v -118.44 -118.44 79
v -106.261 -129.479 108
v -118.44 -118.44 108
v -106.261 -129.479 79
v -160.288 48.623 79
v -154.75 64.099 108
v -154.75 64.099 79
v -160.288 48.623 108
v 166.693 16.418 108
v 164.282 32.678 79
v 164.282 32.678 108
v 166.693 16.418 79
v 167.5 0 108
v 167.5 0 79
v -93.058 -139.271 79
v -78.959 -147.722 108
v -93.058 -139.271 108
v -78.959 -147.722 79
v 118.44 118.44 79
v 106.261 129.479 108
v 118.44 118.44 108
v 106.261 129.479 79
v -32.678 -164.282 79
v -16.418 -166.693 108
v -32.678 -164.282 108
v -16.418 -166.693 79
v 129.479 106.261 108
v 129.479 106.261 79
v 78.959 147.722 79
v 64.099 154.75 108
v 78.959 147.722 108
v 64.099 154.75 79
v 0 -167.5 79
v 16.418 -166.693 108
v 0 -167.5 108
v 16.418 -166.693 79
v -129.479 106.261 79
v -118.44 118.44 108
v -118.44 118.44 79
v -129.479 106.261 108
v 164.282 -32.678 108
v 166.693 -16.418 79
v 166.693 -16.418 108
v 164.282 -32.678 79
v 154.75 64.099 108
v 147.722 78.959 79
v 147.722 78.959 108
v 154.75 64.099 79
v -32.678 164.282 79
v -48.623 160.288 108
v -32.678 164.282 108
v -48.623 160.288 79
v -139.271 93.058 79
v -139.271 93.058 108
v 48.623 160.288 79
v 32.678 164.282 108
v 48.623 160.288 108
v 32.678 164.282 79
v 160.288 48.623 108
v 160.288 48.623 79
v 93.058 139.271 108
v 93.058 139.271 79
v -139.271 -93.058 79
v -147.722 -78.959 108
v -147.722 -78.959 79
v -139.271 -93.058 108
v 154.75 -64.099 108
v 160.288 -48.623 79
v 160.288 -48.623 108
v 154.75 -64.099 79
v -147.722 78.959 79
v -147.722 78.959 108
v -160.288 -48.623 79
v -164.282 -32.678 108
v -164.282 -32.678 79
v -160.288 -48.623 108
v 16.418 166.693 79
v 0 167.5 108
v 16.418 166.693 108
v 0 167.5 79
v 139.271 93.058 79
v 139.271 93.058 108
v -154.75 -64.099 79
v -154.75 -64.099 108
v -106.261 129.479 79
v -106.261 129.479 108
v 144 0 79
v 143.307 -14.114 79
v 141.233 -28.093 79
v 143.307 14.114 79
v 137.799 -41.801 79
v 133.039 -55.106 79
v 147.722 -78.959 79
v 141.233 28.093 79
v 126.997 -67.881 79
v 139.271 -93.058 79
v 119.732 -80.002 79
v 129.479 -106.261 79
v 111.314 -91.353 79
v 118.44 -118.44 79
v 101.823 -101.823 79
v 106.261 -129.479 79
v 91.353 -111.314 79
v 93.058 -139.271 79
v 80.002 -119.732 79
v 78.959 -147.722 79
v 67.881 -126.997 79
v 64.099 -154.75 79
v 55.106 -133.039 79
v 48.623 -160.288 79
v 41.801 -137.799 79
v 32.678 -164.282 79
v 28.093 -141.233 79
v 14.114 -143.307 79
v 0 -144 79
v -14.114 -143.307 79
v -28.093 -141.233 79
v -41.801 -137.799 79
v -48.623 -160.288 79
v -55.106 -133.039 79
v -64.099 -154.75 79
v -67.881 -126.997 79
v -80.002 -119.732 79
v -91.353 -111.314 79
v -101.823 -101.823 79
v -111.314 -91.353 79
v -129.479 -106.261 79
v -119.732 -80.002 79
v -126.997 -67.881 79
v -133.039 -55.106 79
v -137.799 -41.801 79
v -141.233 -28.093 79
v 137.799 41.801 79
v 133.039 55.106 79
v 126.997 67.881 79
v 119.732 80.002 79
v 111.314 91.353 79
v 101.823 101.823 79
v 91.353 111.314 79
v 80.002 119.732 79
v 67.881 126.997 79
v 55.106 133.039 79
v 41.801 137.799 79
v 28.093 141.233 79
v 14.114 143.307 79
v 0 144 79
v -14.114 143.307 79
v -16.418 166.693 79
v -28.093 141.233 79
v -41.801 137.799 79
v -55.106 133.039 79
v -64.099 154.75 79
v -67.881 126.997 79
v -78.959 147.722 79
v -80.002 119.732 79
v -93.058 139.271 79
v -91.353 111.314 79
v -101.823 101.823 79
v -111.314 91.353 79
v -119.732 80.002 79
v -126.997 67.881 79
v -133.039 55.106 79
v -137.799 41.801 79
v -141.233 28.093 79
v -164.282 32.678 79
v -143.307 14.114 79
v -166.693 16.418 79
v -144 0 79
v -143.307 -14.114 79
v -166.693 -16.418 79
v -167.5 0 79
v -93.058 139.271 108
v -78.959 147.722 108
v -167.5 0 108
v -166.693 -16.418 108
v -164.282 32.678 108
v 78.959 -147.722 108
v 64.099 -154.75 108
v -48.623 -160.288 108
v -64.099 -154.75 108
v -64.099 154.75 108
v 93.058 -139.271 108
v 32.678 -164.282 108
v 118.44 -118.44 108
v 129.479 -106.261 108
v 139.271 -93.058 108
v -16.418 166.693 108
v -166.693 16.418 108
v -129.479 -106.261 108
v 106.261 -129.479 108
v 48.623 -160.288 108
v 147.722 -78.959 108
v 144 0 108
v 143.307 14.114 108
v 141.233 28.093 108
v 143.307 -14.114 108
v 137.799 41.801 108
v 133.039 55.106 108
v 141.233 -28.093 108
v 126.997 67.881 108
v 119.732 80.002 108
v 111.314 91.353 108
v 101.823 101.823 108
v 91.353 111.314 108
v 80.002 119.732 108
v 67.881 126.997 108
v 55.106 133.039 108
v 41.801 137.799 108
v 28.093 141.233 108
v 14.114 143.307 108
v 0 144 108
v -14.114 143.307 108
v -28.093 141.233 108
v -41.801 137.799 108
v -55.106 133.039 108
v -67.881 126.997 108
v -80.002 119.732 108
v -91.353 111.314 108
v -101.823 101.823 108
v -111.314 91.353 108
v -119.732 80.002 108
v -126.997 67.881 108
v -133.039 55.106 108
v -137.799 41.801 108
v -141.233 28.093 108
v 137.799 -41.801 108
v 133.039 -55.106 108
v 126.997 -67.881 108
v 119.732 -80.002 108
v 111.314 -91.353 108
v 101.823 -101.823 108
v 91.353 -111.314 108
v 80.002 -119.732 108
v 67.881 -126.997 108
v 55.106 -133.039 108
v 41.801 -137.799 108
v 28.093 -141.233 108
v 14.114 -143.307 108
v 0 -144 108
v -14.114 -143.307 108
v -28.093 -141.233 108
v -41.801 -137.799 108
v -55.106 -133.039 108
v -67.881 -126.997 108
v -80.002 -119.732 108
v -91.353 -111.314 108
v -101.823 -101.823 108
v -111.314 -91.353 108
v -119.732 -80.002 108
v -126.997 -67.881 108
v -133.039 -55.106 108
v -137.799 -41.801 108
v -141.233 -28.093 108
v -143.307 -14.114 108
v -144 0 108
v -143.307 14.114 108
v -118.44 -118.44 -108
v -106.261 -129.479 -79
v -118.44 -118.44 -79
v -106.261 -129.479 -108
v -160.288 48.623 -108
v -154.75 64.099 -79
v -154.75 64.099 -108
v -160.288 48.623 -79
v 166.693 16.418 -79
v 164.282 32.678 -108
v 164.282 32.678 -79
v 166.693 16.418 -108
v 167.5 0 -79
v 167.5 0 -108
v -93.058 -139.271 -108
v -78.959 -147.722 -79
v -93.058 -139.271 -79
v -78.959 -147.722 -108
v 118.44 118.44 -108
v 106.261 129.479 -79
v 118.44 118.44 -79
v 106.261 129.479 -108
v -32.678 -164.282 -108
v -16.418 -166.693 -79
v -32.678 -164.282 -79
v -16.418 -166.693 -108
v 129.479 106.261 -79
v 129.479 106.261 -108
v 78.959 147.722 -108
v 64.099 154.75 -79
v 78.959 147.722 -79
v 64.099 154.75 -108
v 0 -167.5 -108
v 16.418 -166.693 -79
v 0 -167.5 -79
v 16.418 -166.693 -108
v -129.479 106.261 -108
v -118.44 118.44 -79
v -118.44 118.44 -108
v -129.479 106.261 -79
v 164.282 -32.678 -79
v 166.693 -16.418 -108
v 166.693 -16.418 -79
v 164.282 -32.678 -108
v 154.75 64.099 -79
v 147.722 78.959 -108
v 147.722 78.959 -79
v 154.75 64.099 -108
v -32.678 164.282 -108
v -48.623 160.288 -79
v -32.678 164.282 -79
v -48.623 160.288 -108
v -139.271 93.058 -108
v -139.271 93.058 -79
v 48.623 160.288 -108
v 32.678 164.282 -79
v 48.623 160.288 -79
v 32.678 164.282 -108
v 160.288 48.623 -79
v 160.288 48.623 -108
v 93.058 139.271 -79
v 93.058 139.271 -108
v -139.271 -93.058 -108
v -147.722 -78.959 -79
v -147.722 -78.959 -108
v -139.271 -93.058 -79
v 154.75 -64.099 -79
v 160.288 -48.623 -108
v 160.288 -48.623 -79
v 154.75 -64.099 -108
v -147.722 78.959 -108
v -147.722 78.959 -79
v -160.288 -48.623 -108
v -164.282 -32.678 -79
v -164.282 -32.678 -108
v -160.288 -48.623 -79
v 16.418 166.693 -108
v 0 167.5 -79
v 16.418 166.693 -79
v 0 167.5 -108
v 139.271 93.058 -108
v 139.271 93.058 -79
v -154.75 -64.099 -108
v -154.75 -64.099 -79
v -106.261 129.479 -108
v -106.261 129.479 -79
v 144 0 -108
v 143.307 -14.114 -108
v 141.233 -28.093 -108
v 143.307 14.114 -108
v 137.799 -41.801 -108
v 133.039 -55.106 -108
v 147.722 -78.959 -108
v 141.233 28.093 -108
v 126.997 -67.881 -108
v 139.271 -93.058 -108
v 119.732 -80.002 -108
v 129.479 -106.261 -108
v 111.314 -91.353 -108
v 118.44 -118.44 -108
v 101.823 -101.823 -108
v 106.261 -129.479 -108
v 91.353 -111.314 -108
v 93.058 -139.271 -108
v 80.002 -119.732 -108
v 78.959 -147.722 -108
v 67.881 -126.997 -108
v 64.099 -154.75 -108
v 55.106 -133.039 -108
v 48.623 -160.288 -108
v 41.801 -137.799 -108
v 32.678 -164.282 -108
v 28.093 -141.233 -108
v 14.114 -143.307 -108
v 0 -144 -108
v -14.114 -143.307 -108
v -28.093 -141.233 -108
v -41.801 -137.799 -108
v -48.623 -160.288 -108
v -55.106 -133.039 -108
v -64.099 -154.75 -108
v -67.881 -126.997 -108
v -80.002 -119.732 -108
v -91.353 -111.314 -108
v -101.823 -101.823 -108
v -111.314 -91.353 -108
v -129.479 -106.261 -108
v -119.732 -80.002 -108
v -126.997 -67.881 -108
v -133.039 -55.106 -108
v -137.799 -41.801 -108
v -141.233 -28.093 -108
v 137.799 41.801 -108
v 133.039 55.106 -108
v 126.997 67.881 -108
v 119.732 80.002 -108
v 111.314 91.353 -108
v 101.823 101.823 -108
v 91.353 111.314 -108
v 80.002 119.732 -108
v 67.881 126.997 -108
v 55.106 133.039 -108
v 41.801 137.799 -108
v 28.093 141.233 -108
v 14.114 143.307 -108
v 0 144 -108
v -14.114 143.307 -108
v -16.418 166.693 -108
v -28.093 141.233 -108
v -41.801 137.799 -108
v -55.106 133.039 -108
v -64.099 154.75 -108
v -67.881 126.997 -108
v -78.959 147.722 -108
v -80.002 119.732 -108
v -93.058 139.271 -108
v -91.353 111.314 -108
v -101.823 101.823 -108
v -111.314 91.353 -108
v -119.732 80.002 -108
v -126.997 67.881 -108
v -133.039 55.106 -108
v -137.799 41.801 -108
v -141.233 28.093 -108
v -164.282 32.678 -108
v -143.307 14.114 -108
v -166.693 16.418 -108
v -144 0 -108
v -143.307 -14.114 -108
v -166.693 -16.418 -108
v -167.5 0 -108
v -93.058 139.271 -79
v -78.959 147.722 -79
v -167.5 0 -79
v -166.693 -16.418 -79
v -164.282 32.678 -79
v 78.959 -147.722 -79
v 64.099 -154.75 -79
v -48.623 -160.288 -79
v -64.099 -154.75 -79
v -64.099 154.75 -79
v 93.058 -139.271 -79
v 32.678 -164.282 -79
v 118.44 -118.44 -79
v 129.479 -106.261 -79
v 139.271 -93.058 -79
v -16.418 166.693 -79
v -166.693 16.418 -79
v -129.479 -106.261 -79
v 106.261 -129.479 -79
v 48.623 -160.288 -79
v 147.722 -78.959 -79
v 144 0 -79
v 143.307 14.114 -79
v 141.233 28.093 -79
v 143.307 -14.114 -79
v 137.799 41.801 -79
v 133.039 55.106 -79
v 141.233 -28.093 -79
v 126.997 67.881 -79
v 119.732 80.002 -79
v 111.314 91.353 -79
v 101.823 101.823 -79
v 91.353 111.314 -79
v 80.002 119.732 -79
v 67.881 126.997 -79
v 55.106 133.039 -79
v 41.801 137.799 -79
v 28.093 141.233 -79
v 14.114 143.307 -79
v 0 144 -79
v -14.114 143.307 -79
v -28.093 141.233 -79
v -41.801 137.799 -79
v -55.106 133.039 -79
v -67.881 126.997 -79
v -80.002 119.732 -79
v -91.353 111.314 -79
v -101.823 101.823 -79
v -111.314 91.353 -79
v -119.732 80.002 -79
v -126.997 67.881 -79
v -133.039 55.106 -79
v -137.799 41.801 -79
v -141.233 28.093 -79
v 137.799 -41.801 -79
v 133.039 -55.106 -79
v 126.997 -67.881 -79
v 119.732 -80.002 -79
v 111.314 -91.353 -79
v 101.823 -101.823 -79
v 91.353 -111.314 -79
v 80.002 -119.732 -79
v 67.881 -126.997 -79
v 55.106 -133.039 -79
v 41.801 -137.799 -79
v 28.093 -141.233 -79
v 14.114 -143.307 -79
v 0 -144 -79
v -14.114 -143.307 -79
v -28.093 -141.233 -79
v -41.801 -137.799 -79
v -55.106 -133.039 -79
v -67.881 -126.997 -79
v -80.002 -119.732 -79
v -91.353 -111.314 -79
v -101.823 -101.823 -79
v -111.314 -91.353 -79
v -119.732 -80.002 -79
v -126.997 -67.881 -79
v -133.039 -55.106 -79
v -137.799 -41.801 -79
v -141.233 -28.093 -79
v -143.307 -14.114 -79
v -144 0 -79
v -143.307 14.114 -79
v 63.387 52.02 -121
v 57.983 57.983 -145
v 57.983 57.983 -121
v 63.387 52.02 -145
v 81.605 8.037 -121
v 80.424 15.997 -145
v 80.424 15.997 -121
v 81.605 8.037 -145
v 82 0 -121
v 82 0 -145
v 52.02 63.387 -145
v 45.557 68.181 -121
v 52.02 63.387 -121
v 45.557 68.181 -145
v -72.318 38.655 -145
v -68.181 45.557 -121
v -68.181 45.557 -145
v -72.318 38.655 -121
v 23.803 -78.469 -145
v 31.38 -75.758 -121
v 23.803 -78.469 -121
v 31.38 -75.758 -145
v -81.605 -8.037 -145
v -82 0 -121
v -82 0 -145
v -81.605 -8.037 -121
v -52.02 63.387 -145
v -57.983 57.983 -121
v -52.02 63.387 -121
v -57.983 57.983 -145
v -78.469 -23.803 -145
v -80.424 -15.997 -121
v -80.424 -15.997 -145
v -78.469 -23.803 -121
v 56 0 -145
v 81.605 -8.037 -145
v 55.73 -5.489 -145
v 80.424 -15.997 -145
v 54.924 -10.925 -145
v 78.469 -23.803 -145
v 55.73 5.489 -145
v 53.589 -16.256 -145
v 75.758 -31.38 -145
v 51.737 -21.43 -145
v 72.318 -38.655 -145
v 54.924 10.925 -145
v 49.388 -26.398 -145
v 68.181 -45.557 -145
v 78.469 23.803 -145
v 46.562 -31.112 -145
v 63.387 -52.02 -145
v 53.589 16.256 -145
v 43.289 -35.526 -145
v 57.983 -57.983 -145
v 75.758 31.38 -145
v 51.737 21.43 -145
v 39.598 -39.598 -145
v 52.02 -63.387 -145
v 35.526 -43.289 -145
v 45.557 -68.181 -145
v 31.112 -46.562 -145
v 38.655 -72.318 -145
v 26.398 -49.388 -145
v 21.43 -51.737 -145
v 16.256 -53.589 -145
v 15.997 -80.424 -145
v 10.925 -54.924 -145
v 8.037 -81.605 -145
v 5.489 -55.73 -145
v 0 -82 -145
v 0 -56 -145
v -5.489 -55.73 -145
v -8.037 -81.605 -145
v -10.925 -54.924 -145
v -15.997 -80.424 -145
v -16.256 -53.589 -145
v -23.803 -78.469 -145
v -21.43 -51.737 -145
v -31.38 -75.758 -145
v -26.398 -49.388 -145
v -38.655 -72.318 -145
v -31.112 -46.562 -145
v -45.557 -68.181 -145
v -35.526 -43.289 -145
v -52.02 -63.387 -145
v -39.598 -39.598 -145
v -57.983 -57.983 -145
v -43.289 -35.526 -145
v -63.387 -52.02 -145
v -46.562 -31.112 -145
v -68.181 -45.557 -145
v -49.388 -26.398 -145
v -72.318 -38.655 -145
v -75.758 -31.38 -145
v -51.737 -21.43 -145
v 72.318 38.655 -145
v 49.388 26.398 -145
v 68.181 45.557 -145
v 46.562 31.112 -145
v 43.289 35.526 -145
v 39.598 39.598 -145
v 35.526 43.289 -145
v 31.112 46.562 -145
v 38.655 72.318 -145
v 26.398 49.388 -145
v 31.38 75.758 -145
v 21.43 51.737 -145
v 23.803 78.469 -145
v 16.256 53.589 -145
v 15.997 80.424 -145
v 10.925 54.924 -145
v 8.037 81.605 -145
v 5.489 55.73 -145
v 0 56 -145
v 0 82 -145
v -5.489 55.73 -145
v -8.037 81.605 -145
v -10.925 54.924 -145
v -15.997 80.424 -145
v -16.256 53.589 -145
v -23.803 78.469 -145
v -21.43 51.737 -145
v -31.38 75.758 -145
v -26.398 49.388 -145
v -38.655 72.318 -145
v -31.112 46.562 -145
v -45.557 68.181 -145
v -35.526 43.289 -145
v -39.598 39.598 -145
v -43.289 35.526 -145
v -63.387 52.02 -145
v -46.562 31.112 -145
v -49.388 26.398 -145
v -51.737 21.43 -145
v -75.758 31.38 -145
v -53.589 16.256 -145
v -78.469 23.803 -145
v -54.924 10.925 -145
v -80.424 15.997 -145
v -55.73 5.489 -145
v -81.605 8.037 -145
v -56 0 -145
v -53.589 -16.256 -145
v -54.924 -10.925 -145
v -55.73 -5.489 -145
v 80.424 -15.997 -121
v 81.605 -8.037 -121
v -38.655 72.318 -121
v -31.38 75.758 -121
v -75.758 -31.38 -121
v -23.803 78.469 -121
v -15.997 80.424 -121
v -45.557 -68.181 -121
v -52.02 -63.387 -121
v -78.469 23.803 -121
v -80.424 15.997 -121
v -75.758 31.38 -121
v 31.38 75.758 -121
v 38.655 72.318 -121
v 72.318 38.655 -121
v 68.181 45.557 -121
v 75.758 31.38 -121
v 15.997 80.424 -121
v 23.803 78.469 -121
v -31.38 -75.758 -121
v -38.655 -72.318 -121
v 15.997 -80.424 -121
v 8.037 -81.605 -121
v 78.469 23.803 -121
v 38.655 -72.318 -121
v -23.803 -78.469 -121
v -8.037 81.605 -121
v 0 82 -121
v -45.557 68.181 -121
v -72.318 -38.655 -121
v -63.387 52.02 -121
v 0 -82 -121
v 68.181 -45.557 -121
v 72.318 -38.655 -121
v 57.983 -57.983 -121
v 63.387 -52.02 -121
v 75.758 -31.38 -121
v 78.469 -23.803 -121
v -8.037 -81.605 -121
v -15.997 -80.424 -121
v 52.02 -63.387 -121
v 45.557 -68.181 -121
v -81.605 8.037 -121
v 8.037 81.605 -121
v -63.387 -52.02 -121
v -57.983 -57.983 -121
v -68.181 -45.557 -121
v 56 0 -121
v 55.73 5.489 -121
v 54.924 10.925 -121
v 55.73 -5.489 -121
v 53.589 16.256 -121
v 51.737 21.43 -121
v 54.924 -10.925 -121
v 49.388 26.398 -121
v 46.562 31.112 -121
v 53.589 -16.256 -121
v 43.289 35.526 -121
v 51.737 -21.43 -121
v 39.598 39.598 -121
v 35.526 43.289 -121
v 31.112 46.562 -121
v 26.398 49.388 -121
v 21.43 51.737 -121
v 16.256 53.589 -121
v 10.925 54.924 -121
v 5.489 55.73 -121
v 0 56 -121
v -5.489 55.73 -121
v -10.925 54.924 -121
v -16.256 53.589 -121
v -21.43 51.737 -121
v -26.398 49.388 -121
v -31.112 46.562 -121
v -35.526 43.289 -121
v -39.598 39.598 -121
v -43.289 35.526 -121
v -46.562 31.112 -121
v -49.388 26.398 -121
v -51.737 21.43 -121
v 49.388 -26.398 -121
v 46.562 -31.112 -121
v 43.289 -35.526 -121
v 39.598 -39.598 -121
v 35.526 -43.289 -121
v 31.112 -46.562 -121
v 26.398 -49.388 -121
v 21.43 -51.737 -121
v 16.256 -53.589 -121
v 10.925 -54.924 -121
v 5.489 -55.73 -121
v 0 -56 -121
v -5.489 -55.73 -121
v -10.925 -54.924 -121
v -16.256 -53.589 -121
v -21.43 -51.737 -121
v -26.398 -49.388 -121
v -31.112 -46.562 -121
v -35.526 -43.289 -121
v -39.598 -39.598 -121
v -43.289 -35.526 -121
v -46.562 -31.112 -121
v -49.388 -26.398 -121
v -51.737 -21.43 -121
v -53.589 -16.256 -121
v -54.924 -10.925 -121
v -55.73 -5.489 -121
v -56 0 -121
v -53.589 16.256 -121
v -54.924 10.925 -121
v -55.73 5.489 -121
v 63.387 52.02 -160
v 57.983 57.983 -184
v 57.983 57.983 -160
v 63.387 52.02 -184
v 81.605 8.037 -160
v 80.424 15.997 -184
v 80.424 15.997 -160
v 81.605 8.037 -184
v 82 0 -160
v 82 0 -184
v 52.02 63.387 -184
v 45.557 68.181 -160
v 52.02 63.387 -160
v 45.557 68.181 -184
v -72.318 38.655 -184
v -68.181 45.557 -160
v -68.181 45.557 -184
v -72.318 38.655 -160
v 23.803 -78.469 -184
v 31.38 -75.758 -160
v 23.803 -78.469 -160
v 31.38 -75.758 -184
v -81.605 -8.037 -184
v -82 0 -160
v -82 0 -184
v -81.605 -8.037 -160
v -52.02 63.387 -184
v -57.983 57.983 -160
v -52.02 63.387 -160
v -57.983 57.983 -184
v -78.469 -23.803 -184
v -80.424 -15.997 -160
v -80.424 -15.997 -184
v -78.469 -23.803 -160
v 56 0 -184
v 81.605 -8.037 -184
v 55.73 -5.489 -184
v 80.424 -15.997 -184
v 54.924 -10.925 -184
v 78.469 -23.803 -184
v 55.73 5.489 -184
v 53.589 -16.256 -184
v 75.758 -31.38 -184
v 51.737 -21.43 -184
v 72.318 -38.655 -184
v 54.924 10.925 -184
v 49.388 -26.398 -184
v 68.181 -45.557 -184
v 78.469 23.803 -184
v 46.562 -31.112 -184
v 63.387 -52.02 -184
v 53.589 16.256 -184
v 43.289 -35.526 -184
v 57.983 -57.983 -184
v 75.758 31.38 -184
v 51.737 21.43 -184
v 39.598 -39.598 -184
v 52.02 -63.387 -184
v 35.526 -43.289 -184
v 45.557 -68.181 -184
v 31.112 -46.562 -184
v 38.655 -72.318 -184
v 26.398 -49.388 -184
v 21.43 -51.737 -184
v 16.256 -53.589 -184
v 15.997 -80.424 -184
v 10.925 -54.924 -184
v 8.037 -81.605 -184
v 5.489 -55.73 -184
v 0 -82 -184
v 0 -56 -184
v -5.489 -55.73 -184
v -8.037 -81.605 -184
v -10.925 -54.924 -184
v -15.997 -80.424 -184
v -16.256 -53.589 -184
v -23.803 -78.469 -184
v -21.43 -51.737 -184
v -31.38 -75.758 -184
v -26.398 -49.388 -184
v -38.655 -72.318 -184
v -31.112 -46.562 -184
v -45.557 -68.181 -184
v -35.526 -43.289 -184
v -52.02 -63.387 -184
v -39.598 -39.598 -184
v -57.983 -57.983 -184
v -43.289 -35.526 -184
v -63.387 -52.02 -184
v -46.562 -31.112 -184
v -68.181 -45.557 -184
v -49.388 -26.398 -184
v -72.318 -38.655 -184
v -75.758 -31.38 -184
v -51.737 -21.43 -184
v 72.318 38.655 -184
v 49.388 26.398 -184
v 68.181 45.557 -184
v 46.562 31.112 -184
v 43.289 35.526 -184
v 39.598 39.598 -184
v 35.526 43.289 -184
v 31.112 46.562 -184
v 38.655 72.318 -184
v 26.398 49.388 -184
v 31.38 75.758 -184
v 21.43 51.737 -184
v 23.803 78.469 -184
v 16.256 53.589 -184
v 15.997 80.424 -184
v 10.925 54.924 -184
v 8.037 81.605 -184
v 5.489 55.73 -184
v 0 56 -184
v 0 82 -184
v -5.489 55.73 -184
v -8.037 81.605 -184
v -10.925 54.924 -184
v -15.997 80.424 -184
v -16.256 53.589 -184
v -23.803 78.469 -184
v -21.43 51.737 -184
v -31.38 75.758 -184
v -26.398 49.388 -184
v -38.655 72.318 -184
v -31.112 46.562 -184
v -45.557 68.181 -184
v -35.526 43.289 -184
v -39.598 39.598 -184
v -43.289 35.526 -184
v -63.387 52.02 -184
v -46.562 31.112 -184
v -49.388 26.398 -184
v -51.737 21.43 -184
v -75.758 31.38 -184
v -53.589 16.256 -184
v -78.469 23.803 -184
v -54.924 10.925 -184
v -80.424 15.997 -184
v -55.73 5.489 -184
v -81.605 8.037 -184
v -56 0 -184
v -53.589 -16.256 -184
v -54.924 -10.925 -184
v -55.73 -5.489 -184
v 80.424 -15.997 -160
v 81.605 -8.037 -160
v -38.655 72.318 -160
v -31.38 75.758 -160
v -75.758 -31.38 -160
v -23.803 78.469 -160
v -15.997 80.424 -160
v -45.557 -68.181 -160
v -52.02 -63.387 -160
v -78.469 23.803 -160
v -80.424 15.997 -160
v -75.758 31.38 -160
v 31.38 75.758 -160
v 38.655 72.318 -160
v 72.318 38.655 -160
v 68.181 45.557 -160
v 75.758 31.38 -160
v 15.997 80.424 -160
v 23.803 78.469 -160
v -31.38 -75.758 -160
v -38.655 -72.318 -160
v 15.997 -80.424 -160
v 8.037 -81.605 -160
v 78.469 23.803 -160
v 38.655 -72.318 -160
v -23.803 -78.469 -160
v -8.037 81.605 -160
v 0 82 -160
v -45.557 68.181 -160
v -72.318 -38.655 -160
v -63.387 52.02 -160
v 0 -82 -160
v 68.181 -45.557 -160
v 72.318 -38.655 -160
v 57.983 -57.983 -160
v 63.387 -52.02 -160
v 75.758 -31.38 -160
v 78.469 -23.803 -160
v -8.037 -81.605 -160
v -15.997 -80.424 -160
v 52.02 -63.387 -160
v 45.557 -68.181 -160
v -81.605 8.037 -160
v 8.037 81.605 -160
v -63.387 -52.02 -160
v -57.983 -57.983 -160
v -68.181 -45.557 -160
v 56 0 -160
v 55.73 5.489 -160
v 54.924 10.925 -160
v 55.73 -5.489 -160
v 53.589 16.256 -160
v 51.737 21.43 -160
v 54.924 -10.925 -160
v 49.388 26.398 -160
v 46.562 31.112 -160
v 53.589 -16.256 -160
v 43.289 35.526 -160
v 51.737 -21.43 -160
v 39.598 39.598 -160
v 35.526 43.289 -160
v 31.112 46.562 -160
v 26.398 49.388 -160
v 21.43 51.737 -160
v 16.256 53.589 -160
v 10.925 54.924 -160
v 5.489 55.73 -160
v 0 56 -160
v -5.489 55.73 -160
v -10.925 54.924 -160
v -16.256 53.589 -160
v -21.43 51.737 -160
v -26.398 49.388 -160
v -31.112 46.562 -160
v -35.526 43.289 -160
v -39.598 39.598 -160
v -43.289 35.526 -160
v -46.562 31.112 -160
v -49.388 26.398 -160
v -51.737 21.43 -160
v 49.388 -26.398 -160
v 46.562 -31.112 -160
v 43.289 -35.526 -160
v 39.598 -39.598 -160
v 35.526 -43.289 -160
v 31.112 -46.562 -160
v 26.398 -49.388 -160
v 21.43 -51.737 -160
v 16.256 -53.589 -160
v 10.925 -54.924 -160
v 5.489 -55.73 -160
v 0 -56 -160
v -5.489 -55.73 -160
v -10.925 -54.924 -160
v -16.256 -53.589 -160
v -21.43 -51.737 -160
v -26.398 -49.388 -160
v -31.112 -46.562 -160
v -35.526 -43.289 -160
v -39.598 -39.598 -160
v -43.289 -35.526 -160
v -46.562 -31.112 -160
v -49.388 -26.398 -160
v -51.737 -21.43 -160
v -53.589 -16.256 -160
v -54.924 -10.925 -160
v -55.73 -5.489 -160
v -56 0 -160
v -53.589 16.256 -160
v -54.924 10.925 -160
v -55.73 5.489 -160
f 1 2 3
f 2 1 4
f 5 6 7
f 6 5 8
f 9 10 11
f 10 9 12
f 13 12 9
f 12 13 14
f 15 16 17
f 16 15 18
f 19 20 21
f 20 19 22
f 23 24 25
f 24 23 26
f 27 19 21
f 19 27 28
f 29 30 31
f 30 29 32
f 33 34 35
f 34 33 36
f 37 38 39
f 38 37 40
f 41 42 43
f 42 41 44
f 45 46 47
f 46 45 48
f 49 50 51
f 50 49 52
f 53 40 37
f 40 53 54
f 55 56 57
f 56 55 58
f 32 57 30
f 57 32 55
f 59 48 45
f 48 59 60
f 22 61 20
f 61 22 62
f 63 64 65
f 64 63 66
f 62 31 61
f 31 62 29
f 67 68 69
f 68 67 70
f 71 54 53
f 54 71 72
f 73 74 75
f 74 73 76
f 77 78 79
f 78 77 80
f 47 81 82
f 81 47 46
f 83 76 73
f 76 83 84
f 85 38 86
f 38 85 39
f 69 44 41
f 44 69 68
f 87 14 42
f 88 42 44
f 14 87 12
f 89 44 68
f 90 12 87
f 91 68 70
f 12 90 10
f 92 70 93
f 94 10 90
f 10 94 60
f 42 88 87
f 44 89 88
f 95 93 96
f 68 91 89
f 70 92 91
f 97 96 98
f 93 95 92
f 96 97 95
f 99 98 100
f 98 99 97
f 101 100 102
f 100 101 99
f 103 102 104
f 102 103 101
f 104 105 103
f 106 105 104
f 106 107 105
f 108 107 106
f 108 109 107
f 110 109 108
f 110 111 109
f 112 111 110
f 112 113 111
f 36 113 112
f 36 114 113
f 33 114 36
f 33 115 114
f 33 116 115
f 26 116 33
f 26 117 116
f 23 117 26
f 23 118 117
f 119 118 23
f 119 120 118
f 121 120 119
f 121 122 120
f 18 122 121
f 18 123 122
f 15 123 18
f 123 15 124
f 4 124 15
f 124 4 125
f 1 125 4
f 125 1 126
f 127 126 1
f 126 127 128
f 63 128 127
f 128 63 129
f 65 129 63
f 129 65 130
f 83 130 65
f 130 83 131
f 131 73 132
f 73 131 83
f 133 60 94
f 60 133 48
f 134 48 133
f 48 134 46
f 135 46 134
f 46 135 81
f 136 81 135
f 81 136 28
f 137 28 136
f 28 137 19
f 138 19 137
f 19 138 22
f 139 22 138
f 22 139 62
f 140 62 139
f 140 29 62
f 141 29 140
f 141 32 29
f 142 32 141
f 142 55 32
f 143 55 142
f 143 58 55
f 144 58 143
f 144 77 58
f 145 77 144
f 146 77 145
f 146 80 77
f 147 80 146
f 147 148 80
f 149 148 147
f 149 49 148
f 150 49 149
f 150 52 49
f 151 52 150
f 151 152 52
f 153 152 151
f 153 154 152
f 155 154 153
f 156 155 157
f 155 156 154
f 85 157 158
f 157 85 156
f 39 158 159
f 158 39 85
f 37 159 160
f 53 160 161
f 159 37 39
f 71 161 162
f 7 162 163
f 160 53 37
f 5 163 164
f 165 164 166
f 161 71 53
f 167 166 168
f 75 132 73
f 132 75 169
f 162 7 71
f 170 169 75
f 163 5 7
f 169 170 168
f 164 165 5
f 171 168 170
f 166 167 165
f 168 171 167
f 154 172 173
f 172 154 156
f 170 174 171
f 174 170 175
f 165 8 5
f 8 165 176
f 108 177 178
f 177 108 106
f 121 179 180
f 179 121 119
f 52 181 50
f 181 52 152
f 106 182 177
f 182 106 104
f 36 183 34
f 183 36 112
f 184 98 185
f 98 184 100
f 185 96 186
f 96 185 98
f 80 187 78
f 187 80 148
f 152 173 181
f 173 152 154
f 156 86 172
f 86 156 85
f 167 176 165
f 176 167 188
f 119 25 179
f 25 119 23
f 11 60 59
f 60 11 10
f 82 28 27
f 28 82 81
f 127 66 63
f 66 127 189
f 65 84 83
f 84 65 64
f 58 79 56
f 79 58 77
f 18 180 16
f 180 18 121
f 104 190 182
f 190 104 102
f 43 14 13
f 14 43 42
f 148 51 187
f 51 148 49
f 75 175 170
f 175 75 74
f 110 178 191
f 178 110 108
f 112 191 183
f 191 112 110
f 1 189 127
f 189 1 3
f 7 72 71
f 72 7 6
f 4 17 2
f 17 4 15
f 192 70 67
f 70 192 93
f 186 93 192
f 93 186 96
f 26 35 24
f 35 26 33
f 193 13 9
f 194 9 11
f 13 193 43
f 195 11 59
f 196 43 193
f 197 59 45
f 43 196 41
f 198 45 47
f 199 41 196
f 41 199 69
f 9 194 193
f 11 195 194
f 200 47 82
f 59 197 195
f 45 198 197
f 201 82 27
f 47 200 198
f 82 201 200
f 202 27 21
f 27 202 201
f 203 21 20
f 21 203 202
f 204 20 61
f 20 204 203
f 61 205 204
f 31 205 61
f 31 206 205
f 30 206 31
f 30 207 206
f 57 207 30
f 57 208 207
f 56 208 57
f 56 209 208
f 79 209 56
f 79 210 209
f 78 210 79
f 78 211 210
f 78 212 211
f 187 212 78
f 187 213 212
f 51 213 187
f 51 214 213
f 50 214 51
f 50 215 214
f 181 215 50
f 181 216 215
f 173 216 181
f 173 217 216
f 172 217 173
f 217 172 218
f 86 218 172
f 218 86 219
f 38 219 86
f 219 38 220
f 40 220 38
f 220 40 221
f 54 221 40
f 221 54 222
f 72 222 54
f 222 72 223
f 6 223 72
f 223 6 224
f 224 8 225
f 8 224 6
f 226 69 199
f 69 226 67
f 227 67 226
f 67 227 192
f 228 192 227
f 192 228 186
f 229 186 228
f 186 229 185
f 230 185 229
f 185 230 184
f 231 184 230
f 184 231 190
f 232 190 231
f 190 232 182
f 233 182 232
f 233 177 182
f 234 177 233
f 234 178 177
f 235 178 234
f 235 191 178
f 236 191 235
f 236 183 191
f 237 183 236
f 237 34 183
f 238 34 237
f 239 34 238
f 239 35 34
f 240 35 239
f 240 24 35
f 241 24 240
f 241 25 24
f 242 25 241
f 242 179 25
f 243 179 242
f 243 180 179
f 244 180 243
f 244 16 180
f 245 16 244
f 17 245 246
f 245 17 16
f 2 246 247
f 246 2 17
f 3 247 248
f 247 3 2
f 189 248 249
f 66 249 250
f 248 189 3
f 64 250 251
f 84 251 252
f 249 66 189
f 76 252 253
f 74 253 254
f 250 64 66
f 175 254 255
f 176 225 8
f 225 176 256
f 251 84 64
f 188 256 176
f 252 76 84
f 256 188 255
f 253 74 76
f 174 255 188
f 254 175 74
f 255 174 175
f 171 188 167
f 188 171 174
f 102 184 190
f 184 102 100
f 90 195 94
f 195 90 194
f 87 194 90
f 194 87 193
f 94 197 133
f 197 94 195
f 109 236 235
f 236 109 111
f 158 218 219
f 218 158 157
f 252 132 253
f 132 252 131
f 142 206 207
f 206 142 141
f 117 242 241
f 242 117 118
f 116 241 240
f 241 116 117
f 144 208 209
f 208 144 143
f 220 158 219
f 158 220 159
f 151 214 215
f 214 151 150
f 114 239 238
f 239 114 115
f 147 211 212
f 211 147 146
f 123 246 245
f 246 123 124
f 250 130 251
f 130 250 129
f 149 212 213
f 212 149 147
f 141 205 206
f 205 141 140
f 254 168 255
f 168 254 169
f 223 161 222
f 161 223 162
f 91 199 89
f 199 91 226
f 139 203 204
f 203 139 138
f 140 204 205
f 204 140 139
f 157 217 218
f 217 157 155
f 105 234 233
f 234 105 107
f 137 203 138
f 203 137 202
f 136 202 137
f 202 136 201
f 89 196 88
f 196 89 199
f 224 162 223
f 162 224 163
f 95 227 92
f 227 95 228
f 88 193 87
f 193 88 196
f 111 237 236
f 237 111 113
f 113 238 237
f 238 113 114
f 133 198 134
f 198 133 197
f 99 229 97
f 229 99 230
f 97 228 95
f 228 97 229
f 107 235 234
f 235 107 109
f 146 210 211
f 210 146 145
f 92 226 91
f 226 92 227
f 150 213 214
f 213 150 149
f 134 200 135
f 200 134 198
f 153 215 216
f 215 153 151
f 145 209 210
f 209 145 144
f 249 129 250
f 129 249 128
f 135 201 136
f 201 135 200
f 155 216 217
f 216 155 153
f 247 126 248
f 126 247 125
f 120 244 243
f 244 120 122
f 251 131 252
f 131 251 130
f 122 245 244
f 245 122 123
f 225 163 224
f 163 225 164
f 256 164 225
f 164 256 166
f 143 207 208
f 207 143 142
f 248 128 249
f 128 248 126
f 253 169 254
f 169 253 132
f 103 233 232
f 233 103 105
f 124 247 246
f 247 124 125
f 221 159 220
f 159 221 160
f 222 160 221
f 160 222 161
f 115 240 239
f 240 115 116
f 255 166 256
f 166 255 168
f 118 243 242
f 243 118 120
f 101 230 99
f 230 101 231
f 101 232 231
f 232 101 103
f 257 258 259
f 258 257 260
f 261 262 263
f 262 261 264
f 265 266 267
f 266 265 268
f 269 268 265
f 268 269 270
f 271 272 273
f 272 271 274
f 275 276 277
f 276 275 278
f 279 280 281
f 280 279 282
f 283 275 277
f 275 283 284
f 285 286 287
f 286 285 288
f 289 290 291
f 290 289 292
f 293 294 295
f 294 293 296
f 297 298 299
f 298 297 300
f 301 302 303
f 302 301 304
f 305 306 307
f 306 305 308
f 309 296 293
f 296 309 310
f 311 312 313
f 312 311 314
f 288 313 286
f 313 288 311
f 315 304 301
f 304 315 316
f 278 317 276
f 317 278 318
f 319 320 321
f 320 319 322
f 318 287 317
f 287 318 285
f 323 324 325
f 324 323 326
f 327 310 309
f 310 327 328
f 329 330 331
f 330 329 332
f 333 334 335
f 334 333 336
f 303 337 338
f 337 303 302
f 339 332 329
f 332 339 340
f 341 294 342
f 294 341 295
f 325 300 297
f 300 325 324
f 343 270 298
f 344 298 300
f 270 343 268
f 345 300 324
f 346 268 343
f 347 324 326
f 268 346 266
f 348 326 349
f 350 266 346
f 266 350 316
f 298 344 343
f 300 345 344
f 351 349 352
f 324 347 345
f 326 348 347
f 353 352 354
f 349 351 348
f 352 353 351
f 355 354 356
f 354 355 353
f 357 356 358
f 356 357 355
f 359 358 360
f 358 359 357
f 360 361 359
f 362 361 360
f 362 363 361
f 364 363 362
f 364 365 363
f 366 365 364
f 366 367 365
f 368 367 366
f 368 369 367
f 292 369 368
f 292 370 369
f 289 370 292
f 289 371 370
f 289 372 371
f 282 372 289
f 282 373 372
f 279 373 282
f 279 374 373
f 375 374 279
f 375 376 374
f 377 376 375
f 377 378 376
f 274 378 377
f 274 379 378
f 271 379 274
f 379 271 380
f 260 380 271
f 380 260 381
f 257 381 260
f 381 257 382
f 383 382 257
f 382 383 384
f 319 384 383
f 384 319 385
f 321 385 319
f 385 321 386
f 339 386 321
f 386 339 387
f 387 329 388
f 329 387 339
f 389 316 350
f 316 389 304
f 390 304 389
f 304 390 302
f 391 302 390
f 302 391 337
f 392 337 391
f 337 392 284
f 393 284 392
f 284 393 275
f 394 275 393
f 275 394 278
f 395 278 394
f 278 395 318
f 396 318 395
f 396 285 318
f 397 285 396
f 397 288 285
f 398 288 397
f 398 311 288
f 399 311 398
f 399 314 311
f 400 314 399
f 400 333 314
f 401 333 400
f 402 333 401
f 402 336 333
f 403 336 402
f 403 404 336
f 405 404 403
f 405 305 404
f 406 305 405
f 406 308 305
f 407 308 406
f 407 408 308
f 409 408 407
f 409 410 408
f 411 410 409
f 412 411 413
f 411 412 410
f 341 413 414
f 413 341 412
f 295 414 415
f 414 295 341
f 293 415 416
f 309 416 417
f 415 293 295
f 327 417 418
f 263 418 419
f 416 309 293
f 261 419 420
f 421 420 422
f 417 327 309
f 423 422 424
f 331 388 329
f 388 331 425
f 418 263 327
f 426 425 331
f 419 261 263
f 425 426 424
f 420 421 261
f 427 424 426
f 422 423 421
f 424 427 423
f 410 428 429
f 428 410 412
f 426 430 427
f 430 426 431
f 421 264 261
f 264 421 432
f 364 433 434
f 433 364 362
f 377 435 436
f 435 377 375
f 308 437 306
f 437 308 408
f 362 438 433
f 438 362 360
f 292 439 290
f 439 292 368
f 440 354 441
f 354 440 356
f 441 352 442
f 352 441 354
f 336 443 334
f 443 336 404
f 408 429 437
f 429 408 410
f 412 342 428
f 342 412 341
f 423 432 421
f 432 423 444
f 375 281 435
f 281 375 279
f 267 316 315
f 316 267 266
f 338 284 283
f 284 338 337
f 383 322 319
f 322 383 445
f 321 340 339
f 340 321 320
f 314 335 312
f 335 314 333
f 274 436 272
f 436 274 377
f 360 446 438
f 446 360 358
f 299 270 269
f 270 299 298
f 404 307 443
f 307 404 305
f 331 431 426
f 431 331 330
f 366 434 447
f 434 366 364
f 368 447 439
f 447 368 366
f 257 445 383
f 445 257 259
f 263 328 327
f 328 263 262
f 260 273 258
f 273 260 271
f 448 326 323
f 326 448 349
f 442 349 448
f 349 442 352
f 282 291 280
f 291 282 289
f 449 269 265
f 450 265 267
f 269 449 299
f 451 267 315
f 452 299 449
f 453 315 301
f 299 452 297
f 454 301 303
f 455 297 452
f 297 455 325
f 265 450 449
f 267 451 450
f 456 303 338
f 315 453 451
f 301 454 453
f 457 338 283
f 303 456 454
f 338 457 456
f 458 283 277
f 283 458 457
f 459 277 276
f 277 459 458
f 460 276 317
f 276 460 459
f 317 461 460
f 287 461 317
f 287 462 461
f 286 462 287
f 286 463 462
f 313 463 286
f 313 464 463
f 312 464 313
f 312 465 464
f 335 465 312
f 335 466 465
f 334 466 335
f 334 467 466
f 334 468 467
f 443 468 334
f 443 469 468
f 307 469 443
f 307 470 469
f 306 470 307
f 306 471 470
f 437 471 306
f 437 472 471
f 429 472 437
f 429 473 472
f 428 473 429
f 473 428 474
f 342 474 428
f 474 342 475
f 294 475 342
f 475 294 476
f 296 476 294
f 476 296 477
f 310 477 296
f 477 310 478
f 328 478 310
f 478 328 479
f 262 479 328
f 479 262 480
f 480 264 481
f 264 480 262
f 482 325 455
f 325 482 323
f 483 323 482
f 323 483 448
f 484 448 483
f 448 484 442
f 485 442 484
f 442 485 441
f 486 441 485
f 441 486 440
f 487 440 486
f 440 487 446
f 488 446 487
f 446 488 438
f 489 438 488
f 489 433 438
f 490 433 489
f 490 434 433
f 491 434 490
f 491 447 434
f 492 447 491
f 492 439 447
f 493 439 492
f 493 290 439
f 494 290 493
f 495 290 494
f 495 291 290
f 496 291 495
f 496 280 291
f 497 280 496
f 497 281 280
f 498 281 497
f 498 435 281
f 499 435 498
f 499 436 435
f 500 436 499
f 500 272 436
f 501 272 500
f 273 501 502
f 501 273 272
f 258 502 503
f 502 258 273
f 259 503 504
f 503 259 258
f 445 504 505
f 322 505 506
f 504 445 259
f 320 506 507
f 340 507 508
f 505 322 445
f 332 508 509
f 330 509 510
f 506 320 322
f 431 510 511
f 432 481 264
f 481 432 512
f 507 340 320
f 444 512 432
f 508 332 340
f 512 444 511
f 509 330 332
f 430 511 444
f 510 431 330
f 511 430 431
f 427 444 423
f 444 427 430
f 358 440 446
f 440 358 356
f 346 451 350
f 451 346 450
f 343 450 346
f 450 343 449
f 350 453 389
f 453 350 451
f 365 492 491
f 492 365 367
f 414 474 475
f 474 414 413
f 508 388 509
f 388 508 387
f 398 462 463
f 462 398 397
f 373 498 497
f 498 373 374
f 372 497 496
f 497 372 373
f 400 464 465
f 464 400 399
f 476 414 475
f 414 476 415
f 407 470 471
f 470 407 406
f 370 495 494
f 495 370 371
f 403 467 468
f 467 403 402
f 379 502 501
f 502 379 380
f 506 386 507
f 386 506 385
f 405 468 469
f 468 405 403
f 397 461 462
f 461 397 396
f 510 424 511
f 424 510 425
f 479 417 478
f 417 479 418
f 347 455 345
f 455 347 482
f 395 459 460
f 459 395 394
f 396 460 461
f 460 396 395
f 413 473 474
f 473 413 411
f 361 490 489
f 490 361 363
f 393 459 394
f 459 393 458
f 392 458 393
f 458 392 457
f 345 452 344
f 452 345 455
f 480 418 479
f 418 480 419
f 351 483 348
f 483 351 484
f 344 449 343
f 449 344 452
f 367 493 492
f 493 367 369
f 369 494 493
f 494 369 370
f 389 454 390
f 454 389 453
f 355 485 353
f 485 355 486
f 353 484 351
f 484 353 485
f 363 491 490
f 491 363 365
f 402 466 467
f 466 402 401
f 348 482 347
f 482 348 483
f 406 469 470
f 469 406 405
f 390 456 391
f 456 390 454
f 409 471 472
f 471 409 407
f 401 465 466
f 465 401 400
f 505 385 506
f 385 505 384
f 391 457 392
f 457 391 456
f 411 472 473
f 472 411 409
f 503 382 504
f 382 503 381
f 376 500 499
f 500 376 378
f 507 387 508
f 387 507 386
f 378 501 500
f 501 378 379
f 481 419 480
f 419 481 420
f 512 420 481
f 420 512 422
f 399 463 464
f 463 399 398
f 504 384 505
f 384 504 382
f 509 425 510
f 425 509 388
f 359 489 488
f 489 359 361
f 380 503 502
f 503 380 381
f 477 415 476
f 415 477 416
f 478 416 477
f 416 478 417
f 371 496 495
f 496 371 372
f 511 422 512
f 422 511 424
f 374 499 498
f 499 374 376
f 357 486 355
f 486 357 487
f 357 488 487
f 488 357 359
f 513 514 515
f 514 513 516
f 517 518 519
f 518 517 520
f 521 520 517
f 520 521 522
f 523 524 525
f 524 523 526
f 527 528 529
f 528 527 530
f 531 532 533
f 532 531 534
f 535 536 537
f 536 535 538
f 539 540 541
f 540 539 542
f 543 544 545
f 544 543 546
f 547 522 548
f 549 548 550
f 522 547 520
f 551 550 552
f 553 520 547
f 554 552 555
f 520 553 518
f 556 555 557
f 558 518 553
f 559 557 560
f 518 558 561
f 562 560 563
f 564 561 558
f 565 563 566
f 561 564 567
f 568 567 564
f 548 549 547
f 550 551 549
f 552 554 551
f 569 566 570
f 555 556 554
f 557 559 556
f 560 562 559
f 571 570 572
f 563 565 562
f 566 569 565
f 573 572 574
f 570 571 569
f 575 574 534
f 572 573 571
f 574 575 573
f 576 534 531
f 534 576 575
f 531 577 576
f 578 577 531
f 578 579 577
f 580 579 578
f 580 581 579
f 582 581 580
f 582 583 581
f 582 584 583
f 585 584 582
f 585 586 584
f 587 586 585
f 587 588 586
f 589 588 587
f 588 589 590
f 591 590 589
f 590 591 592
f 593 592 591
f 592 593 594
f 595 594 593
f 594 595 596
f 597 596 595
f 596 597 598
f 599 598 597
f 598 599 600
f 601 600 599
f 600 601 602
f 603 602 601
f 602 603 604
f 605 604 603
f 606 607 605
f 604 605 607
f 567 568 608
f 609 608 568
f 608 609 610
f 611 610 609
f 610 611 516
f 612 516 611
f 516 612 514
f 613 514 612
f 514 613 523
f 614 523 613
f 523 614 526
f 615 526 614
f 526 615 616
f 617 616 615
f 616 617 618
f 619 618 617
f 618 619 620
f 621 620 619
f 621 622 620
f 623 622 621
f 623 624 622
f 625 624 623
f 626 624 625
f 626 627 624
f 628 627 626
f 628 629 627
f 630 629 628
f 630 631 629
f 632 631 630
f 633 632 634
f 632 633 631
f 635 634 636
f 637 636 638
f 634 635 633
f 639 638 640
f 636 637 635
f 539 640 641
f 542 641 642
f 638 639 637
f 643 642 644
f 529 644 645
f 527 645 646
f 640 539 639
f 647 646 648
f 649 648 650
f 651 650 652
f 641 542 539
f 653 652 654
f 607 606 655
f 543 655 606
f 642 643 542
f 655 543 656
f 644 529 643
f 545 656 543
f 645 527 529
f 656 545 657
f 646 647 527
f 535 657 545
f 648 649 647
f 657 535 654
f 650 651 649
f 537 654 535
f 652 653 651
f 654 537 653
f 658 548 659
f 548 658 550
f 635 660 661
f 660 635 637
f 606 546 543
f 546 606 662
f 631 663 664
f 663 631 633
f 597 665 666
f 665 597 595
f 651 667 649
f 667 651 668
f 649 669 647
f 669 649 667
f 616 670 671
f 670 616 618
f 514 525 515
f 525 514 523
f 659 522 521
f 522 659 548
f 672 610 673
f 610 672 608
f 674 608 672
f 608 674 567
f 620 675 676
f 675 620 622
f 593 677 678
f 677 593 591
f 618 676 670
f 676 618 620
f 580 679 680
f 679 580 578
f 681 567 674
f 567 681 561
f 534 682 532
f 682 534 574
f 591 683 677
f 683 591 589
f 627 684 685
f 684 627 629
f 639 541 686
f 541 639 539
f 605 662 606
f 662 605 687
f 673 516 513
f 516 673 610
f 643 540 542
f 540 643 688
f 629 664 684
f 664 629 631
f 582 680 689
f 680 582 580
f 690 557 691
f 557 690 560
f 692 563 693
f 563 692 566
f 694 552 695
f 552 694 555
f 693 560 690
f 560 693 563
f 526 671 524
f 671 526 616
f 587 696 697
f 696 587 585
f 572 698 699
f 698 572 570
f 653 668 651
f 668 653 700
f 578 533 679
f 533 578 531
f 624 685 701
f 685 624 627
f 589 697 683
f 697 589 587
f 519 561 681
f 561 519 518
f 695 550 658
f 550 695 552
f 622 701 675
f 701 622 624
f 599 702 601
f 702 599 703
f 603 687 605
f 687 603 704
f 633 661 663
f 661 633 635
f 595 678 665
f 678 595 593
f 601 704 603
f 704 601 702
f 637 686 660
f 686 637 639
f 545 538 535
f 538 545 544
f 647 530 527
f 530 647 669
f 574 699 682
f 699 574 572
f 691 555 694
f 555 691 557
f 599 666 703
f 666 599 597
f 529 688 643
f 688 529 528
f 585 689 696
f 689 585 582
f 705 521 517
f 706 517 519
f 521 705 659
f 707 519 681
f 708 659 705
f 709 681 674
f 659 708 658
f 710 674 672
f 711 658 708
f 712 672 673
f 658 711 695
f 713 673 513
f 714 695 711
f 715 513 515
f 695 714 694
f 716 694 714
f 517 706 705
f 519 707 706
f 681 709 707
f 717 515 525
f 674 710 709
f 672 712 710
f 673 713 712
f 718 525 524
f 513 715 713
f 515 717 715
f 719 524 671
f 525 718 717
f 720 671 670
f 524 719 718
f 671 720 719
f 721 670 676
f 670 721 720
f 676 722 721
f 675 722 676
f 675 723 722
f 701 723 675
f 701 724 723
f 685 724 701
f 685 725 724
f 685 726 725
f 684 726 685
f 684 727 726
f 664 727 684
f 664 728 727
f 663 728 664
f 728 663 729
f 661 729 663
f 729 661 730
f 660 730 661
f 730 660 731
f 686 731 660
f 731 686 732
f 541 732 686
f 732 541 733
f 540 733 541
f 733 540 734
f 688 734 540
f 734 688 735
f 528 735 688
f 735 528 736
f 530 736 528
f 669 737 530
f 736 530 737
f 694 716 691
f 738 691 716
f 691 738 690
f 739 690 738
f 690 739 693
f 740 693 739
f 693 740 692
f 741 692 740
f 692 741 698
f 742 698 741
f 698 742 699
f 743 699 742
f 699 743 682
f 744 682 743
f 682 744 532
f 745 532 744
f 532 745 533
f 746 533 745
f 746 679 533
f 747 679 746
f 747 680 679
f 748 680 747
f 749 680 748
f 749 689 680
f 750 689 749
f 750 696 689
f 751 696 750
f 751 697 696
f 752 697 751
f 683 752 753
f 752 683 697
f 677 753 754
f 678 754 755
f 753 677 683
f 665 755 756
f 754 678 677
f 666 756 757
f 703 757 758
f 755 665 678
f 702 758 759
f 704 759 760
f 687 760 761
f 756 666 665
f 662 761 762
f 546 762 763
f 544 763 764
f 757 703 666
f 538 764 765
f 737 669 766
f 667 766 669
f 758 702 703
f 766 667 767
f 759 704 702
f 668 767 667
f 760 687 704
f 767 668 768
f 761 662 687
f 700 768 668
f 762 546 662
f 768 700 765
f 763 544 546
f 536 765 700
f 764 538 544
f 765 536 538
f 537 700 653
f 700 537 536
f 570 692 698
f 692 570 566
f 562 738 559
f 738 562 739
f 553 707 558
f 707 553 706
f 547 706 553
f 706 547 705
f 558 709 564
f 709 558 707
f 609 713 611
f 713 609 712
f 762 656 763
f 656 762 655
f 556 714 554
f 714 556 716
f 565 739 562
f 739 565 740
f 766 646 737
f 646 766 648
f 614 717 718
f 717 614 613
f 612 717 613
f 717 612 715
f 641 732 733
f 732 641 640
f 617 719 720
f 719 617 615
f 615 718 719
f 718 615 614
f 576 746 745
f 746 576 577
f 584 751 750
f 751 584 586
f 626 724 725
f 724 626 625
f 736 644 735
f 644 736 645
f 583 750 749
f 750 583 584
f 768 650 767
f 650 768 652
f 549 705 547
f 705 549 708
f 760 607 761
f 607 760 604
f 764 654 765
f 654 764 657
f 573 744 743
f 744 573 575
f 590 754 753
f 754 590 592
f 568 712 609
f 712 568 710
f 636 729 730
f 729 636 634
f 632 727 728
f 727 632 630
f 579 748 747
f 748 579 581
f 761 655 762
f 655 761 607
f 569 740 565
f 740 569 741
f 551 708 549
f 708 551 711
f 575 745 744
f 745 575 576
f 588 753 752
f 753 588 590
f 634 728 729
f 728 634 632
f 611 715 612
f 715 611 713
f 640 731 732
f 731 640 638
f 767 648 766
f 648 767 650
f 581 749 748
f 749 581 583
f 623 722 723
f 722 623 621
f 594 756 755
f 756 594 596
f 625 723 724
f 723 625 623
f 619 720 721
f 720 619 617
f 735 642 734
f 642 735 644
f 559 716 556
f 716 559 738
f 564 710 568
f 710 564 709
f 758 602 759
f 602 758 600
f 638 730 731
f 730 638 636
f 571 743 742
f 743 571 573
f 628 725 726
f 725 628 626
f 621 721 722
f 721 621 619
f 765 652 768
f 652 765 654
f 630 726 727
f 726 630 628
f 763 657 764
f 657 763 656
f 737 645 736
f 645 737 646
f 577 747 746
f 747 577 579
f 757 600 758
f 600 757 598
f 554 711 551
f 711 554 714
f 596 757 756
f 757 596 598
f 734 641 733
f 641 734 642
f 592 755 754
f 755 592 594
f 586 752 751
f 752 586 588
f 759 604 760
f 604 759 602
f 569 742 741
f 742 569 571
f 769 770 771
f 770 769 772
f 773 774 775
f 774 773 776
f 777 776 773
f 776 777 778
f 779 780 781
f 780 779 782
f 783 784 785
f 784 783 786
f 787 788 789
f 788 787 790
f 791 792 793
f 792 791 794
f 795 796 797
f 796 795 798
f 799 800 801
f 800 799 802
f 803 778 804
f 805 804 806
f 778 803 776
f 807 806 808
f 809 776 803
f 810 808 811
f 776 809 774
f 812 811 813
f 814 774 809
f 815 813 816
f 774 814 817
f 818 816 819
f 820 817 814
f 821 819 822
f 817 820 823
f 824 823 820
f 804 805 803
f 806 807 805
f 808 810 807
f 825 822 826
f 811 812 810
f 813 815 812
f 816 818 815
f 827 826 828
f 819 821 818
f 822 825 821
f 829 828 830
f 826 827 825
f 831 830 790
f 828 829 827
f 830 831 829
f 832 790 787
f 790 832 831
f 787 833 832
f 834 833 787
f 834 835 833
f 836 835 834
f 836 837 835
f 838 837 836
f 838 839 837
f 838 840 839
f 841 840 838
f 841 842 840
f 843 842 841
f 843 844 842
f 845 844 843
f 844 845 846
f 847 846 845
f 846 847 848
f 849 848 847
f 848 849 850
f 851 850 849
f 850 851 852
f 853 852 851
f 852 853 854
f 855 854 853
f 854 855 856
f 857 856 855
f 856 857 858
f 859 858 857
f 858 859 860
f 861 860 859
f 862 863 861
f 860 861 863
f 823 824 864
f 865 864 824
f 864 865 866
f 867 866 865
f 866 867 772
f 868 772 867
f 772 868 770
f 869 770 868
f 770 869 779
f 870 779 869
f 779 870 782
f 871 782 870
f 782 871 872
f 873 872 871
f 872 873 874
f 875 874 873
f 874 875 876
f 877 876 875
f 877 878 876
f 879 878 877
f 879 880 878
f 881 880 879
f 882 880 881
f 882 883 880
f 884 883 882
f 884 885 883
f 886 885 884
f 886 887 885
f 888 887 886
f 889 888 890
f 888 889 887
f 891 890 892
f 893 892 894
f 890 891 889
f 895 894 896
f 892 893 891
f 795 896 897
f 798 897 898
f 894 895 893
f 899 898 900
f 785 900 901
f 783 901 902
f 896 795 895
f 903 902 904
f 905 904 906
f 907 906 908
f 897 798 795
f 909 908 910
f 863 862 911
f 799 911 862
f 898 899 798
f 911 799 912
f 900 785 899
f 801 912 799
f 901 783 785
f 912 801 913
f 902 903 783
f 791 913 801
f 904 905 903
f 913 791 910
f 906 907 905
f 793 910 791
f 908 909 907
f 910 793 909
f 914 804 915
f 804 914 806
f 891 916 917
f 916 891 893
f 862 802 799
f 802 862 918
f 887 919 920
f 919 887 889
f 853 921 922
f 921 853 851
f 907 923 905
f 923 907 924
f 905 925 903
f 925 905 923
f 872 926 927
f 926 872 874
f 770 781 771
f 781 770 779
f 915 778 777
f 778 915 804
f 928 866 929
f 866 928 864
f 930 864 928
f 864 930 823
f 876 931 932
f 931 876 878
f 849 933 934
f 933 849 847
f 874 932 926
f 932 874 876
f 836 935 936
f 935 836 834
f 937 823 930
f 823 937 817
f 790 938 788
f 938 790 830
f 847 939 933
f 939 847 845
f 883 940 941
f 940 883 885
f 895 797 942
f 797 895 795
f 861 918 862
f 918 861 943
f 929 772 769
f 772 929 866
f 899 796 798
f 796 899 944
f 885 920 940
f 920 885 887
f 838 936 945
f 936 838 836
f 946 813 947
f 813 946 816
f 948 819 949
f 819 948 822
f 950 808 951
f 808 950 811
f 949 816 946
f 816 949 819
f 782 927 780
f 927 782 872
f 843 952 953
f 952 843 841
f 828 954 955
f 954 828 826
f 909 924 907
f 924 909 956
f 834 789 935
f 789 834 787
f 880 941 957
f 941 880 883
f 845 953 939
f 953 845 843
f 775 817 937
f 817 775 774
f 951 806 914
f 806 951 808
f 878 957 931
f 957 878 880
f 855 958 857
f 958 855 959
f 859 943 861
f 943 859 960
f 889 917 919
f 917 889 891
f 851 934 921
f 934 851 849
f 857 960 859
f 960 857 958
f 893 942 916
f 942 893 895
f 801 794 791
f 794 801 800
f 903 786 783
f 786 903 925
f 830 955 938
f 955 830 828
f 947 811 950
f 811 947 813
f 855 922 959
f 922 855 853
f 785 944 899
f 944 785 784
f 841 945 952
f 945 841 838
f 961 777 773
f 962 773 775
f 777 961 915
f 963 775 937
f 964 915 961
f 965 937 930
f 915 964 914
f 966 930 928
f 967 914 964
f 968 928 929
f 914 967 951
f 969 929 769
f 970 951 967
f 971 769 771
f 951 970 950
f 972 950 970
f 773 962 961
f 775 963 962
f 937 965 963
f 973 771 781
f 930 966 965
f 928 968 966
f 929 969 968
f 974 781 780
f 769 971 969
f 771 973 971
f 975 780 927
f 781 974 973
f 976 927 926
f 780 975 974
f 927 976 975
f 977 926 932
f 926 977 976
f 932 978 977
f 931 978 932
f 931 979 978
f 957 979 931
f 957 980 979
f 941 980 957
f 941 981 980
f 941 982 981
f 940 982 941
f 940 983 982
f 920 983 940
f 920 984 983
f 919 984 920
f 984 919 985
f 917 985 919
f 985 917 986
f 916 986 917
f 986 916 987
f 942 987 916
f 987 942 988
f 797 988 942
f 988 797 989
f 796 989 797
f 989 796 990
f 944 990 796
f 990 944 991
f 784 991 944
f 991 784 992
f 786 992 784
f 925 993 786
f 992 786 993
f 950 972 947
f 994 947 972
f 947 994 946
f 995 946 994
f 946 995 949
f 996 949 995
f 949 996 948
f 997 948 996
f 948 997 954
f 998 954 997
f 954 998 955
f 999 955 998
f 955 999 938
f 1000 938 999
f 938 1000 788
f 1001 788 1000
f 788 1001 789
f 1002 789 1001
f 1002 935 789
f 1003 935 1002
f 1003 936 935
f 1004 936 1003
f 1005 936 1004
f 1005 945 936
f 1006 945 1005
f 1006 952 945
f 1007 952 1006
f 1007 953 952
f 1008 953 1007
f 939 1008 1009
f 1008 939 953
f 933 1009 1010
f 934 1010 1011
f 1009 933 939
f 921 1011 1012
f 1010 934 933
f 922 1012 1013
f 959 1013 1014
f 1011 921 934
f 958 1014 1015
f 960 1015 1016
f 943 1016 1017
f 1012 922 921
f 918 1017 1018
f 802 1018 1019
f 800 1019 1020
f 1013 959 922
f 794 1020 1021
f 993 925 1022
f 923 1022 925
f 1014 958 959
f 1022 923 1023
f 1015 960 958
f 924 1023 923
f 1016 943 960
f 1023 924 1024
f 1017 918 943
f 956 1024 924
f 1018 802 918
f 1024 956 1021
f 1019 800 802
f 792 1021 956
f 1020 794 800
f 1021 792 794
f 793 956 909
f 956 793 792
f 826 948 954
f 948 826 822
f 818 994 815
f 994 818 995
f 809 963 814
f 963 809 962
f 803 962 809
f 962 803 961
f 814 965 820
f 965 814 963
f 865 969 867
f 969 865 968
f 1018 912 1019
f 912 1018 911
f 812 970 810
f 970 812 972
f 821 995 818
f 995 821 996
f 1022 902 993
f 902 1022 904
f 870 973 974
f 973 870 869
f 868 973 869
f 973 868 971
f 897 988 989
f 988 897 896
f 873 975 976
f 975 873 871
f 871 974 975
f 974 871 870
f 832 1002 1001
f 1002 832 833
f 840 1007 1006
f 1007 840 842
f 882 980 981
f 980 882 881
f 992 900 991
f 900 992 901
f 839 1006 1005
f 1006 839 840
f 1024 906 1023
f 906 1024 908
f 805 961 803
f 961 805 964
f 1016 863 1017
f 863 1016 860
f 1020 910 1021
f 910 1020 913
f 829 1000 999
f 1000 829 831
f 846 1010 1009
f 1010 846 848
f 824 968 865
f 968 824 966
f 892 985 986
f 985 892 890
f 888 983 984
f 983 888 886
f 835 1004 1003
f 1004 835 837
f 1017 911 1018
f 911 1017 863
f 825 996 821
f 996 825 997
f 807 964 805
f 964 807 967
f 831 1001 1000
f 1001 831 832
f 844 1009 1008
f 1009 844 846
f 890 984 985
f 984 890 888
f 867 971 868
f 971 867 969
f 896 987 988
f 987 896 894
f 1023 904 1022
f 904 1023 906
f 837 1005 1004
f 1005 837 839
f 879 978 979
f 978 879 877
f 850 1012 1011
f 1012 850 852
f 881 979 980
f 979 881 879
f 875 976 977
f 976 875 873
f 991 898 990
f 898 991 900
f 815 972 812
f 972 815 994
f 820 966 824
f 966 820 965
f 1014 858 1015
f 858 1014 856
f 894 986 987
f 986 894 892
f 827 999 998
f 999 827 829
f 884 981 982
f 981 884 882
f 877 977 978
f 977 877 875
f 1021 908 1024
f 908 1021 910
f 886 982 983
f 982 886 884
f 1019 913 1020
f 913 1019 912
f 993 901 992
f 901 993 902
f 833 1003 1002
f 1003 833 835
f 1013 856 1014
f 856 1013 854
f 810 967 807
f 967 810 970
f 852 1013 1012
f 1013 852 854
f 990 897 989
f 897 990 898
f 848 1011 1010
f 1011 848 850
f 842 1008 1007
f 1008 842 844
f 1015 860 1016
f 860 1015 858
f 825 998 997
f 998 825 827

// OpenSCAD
// ============================================================================
// Atom Lithography Machine — Parametric OpenSCAD Module (S6.3-02)
// ============================================================================
// part_id           : S6.3-02
// parent_bom_id     : S6.3
// subsystem         : S6
// part_name         : Aktif karsi-sargili (bucking) bobin ciftleri (A/B karsi-bobin, Exp125 delta)
// material          : Al-Bronze
// temp_stage        : 4.2 K
// vacuum_grade      : Kriyo-vakum
// tolerance         : ±0.1 mm eksen
// computed_mass_kg  : 11.75596
// envelope_mm       : 334.677 x 306.233 x 321.900
// design_maturity   : M0_M1_DETAILED_CAD_DESIGN_ONLY
// no_lab_measurement: true
// iec61508_certified: false
// semi_s2_certified : false
// Units: millimeters (mm)
// ============================================================================

$fn = 64;

// Nominal bounding envelope parameters (mm)
bbox_x = 334.6768;
bbox_y = 306.2334;
bbox_z = 321.9000;

// Part-specific parametric dimensions
a_r_in = 144.0;
a_r_out = 167.5;
b_r_in = 56.0;
b_r_out = 82.0;
n_lorentz_ties = 8;
lorentz_rating_kn = 200.0;

// Interface / port parameters (mm)
port_a_former_fit_od = 335.000;
port_a_former_fit_bore = 288.000;
port_b_resonator_bore_od = 164.000;
port_b_resonator_bore_bore = 112.000;

module part_S6_3_02() {
  union() {
    // Anchored A_upper active shield coil
    translate([0.000, 0.000, 93.500]) {
      difference() {
        cylinder(d=335.000, h=29.000, center=true);
        cylinder(d=288.000, h=31.000, center=true);
      }
    }
    // Anchored A_lower active shield coil
    translate([0.000, 0.000, -93.500]) {
      difference() {
        cylinder(d=335.000, h=29.000, center=true);
        cylinder(d=288.000, h=31.000, center=true);
      }
    }
    // B_upper bucking coil
    translate([0.000, 0.000, -133.000]) {
      difference() {
        cylinder(d=164.000, h=24.000, center=true);
        cylinder(d=112.000, h=26.000, center=true);
      }
    }
    // B_lower bucking coil
    translate([0.000, 0.000, -172.000]) {
      difference() {
        cylinder(d=164.000, h=24.000, center=true);
        cylinder(d=112.000, h=26.000, center=true);
      }
    }
  }
}

// World assembly mounting transform (global machine frame, mm / deg):
// translate([0.000, 0.000, 500.000]) rotate([0.000, 0.000, 0.000]) part_S6_3_02();

part_S6_3_02();
